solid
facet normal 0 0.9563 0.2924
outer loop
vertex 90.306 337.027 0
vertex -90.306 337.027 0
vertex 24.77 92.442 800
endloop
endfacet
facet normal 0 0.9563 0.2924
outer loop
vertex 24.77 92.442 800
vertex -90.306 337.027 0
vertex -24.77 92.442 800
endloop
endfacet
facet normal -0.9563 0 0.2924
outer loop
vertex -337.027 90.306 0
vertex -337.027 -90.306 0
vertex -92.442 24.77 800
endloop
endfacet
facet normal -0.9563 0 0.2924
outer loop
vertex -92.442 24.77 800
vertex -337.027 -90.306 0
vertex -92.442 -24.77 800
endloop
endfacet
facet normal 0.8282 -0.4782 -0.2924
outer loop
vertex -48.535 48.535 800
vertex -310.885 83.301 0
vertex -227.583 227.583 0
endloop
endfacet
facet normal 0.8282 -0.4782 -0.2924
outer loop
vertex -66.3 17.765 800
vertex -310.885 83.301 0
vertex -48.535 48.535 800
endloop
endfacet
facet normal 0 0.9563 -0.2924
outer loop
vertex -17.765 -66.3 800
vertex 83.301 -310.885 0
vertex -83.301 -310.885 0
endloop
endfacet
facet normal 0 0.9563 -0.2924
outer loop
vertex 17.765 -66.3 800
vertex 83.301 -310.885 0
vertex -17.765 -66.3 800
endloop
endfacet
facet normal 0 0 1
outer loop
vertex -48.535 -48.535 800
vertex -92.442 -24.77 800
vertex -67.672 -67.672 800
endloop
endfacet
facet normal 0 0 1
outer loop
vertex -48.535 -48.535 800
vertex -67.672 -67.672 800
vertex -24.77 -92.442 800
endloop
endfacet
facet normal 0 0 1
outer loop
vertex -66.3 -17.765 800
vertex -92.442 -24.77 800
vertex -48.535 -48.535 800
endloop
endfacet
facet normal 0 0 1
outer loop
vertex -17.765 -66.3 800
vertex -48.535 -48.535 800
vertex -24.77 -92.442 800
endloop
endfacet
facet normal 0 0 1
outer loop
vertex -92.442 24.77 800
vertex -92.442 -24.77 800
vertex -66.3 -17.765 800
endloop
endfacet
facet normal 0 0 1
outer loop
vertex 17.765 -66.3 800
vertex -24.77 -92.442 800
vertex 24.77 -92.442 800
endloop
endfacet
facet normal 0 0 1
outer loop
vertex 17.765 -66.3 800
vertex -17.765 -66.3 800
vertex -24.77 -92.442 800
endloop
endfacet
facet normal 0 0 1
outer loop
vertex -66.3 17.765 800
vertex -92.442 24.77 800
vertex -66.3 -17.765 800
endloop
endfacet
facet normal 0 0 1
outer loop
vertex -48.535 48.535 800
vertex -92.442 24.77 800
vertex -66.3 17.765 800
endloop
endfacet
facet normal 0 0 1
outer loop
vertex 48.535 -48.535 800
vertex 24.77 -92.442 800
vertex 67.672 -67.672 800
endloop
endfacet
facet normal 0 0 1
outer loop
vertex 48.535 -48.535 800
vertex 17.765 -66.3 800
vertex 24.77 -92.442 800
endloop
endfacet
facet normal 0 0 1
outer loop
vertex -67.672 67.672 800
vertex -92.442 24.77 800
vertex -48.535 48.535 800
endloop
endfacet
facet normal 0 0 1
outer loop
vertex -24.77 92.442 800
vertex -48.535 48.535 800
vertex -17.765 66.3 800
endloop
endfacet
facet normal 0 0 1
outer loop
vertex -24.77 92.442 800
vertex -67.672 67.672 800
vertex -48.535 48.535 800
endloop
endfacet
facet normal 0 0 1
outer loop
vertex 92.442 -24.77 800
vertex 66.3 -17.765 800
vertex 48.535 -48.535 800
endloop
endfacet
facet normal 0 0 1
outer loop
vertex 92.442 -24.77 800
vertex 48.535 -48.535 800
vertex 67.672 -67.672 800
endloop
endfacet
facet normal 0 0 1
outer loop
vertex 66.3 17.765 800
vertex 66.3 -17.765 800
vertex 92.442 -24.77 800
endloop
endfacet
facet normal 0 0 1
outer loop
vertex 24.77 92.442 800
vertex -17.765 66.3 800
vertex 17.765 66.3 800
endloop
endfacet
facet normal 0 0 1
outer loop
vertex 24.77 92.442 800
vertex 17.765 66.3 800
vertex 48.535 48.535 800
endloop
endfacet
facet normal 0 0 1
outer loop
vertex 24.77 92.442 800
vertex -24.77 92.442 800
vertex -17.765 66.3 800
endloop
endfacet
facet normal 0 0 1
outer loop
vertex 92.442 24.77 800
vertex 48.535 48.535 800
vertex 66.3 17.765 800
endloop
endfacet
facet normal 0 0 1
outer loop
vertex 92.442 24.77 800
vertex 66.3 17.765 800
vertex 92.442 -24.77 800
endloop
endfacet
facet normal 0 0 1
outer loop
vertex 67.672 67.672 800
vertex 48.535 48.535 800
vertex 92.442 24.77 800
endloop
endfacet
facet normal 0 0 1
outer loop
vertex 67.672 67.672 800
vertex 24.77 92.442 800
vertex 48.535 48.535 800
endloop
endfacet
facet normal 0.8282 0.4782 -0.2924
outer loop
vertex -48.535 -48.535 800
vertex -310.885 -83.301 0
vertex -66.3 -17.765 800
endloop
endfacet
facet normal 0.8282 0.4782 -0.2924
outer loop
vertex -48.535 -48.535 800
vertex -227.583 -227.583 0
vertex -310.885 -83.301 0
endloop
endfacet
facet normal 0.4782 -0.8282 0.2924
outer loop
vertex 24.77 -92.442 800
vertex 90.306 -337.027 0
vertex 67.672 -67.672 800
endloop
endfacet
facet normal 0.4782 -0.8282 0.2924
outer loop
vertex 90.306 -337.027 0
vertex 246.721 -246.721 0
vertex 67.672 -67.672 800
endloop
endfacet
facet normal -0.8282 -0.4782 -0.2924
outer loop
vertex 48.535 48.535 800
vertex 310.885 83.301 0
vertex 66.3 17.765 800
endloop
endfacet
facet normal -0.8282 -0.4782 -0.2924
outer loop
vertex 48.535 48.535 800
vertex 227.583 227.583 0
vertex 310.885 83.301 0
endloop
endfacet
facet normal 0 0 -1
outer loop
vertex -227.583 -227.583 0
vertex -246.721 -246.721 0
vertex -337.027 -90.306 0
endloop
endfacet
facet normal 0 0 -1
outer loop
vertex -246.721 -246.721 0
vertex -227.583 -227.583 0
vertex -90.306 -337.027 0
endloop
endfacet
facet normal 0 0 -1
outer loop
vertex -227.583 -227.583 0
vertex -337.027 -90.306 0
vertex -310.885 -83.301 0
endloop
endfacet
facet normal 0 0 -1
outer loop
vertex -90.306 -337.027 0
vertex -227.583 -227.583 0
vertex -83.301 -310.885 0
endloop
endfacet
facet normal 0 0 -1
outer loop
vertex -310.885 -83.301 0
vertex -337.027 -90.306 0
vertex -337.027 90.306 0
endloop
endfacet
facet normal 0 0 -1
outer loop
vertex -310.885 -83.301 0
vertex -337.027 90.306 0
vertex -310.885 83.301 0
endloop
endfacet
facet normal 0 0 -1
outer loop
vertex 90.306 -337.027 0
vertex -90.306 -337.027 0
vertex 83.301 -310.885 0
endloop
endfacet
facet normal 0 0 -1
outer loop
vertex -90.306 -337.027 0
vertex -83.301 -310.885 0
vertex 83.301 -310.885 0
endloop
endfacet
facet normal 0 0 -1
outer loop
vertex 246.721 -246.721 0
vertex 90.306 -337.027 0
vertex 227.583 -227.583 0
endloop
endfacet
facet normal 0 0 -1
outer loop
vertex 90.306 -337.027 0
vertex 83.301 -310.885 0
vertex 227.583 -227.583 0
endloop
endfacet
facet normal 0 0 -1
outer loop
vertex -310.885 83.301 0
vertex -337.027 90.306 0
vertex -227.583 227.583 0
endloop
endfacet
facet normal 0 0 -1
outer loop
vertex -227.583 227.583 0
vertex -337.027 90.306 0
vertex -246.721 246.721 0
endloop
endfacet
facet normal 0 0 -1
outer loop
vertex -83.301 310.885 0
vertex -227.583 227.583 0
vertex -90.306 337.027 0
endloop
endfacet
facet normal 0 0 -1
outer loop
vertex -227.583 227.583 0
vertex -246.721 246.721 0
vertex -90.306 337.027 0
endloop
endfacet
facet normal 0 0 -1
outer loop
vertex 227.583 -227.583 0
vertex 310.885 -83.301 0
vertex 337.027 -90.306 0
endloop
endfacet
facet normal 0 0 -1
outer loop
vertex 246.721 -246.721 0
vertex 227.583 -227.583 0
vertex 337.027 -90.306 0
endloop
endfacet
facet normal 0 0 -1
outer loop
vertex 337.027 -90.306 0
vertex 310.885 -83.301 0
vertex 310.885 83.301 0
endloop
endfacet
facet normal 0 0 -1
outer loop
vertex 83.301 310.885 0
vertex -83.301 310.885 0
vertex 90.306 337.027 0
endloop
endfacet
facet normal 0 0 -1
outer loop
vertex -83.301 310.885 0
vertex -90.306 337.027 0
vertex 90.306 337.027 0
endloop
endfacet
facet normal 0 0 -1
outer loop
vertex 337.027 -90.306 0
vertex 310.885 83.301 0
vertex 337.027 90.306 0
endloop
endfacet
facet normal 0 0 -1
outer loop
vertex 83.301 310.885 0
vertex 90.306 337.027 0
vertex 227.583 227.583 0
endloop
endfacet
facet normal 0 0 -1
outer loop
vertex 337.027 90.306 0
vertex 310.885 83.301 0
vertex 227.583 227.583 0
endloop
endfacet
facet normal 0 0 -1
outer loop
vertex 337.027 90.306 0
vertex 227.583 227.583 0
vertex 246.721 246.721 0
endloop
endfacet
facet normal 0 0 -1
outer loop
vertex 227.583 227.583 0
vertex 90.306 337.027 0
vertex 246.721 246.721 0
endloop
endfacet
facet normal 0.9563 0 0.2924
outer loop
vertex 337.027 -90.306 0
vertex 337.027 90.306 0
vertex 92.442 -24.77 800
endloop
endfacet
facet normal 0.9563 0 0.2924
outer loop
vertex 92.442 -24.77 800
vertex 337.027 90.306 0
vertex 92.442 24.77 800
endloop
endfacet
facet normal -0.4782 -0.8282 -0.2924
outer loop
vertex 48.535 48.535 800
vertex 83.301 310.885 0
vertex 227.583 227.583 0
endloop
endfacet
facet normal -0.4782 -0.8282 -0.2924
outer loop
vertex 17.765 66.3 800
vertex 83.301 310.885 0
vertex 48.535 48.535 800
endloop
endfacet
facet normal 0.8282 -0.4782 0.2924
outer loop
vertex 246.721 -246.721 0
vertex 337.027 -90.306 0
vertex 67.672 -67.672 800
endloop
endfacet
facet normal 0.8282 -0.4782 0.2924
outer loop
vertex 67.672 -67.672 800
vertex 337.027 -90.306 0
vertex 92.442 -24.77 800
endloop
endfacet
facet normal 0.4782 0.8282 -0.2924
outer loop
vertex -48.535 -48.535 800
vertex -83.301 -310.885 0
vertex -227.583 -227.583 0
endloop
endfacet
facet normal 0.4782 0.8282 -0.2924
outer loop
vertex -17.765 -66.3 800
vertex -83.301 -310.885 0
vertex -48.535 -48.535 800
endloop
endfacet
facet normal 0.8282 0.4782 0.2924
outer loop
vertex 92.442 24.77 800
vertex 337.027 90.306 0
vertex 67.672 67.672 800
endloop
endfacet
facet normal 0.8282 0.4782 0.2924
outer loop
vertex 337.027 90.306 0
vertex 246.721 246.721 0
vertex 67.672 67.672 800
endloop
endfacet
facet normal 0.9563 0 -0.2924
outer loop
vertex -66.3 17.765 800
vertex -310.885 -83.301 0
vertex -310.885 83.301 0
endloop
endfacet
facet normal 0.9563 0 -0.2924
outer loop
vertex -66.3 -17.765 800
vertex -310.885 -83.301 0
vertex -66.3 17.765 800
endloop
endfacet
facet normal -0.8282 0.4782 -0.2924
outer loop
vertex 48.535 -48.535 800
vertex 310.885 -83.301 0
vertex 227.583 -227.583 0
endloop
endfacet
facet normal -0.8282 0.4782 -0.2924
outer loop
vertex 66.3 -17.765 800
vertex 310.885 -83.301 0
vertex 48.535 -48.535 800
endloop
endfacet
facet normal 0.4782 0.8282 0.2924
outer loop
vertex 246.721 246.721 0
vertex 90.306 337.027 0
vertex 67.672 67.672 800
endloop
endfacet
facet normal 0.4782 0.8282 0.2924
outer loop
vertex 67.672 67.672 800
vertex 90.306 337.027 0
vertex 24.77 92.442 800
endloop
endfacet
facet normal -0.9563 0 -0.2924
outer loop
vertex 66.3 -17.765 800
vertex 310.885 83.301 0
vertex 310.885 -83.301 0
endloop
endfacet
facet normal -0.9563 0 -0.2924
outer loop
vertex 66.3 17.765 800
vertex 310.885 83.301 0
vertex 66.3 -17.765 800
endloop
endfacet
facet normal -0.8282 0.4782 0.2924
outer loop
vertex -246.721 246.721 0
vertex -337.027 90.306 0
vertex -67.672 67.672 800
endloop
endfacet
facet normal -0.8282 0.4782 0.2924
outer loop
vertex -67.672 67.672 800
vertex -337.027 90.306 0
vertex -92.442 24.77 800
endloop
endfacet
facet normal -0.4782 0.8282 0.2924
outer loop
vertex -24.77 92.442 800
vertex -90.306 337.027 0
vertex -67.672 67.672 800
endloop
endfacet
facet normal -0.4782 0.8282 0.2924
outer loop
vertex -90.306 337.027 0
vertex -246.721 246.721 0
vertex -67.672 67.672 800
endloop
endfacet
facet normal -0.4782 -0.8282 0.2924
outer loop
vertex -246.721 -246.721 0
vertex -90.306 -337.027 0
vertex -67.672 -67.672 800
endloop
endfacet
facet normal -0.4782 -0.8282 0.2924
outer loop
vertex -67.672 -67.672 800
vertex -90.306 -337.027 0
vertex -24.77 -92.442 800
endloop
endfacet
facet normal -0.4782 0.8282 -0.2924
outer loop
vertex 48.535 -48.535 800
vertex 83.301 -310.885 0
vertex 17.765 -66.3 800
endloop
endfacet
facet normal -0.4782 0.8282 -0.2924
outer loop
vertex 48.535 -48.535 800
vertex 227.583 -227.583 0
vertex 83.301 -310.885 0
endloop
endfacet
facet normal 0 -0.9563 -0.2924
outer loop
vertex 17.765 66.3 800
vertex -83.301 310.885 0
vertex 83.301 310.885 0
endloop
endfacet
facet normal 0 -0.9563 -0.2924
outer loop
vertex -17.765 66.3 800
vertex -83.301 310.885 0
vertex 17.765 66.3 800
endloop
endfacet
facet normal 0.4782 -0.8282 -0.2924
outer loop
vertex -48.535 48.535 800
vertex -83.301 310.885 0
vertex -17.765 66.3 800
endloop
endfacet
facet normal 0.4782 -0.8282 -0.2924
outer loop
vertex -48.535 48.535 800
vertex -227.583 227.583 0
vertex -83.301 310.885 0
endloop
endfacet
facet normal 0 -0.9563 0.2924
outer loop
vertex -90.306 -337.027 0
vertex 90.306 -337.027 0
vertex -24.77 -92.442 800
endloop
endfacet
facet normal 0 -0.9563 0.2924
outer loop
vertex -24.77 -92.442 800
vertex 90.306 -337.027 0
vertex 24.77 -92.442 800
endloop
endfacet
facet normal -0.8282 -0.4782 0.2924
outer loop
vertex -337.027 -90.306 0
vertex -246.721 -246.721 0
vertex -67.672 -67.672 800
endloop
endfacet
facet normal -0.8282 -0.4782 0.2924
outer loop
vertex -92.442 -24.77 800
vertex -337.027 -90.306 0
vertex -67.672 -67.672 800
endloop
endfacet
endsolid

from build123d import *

# Parameters (mm, degrees)
F2_DEPTH = 800
F2_TAPER = 17
F3_T     = 25
F5_DEPTH = 25


with BuildPart() as f2:
    # F0 (on Top) → F2 (new body)
    with BuildSketch(Plane.XY):
        Polygon((-310.8845726812, 83.3012701892), (-310.8845726812, -83.3012701892), (-227.583302492, -227.583302492), (-83.3012701892, -310.8845726812), (83.3012701892, -310.8845726812), (227.583302492, -227.583302492), (310.8845726812, -83.3012701892), (310.8845726812, 83.3012701892), (227.583302492, 227.583302492), (83.3012701892, 310.8845726812), (-83.3012701892, 310.8845726812), (-227.583302492, 227.583302492), align=None)
    extrude(amount=F2_DEPTH, taper=F2_TAPER)

    # F3
    f3_openings = [f2.faces().sort_by_distance(p)[0] for p in [
        (0, 0, 0),
    ]]
    offset(amount=F3_T, openings=f3_openings, kind=Kind.INTERSECTION)

    # F4 (on offset) → F5 (cut)
    with BuildSketch(Plane.XY.offset(800)):
        Polygon((93.3012701892, -25), (93.3012701892, 25), (68.3012701892, 68.3012701892), (25, 93.3012701892), (-25, 93.3012701892), (-68.3012701892, 68.3012701892), (-93.3012701892, 25), (-93.3012701892, -25), (-68.3012701892, -68.3012701892), (-25, -93.3012701892), (25, -93.3012701892), (68.3012701892, -68.3012701892), align=None)
    extrude(amount=F5_DEPTH, mode=Mode.SUBTRACT)


solid = f2.part
